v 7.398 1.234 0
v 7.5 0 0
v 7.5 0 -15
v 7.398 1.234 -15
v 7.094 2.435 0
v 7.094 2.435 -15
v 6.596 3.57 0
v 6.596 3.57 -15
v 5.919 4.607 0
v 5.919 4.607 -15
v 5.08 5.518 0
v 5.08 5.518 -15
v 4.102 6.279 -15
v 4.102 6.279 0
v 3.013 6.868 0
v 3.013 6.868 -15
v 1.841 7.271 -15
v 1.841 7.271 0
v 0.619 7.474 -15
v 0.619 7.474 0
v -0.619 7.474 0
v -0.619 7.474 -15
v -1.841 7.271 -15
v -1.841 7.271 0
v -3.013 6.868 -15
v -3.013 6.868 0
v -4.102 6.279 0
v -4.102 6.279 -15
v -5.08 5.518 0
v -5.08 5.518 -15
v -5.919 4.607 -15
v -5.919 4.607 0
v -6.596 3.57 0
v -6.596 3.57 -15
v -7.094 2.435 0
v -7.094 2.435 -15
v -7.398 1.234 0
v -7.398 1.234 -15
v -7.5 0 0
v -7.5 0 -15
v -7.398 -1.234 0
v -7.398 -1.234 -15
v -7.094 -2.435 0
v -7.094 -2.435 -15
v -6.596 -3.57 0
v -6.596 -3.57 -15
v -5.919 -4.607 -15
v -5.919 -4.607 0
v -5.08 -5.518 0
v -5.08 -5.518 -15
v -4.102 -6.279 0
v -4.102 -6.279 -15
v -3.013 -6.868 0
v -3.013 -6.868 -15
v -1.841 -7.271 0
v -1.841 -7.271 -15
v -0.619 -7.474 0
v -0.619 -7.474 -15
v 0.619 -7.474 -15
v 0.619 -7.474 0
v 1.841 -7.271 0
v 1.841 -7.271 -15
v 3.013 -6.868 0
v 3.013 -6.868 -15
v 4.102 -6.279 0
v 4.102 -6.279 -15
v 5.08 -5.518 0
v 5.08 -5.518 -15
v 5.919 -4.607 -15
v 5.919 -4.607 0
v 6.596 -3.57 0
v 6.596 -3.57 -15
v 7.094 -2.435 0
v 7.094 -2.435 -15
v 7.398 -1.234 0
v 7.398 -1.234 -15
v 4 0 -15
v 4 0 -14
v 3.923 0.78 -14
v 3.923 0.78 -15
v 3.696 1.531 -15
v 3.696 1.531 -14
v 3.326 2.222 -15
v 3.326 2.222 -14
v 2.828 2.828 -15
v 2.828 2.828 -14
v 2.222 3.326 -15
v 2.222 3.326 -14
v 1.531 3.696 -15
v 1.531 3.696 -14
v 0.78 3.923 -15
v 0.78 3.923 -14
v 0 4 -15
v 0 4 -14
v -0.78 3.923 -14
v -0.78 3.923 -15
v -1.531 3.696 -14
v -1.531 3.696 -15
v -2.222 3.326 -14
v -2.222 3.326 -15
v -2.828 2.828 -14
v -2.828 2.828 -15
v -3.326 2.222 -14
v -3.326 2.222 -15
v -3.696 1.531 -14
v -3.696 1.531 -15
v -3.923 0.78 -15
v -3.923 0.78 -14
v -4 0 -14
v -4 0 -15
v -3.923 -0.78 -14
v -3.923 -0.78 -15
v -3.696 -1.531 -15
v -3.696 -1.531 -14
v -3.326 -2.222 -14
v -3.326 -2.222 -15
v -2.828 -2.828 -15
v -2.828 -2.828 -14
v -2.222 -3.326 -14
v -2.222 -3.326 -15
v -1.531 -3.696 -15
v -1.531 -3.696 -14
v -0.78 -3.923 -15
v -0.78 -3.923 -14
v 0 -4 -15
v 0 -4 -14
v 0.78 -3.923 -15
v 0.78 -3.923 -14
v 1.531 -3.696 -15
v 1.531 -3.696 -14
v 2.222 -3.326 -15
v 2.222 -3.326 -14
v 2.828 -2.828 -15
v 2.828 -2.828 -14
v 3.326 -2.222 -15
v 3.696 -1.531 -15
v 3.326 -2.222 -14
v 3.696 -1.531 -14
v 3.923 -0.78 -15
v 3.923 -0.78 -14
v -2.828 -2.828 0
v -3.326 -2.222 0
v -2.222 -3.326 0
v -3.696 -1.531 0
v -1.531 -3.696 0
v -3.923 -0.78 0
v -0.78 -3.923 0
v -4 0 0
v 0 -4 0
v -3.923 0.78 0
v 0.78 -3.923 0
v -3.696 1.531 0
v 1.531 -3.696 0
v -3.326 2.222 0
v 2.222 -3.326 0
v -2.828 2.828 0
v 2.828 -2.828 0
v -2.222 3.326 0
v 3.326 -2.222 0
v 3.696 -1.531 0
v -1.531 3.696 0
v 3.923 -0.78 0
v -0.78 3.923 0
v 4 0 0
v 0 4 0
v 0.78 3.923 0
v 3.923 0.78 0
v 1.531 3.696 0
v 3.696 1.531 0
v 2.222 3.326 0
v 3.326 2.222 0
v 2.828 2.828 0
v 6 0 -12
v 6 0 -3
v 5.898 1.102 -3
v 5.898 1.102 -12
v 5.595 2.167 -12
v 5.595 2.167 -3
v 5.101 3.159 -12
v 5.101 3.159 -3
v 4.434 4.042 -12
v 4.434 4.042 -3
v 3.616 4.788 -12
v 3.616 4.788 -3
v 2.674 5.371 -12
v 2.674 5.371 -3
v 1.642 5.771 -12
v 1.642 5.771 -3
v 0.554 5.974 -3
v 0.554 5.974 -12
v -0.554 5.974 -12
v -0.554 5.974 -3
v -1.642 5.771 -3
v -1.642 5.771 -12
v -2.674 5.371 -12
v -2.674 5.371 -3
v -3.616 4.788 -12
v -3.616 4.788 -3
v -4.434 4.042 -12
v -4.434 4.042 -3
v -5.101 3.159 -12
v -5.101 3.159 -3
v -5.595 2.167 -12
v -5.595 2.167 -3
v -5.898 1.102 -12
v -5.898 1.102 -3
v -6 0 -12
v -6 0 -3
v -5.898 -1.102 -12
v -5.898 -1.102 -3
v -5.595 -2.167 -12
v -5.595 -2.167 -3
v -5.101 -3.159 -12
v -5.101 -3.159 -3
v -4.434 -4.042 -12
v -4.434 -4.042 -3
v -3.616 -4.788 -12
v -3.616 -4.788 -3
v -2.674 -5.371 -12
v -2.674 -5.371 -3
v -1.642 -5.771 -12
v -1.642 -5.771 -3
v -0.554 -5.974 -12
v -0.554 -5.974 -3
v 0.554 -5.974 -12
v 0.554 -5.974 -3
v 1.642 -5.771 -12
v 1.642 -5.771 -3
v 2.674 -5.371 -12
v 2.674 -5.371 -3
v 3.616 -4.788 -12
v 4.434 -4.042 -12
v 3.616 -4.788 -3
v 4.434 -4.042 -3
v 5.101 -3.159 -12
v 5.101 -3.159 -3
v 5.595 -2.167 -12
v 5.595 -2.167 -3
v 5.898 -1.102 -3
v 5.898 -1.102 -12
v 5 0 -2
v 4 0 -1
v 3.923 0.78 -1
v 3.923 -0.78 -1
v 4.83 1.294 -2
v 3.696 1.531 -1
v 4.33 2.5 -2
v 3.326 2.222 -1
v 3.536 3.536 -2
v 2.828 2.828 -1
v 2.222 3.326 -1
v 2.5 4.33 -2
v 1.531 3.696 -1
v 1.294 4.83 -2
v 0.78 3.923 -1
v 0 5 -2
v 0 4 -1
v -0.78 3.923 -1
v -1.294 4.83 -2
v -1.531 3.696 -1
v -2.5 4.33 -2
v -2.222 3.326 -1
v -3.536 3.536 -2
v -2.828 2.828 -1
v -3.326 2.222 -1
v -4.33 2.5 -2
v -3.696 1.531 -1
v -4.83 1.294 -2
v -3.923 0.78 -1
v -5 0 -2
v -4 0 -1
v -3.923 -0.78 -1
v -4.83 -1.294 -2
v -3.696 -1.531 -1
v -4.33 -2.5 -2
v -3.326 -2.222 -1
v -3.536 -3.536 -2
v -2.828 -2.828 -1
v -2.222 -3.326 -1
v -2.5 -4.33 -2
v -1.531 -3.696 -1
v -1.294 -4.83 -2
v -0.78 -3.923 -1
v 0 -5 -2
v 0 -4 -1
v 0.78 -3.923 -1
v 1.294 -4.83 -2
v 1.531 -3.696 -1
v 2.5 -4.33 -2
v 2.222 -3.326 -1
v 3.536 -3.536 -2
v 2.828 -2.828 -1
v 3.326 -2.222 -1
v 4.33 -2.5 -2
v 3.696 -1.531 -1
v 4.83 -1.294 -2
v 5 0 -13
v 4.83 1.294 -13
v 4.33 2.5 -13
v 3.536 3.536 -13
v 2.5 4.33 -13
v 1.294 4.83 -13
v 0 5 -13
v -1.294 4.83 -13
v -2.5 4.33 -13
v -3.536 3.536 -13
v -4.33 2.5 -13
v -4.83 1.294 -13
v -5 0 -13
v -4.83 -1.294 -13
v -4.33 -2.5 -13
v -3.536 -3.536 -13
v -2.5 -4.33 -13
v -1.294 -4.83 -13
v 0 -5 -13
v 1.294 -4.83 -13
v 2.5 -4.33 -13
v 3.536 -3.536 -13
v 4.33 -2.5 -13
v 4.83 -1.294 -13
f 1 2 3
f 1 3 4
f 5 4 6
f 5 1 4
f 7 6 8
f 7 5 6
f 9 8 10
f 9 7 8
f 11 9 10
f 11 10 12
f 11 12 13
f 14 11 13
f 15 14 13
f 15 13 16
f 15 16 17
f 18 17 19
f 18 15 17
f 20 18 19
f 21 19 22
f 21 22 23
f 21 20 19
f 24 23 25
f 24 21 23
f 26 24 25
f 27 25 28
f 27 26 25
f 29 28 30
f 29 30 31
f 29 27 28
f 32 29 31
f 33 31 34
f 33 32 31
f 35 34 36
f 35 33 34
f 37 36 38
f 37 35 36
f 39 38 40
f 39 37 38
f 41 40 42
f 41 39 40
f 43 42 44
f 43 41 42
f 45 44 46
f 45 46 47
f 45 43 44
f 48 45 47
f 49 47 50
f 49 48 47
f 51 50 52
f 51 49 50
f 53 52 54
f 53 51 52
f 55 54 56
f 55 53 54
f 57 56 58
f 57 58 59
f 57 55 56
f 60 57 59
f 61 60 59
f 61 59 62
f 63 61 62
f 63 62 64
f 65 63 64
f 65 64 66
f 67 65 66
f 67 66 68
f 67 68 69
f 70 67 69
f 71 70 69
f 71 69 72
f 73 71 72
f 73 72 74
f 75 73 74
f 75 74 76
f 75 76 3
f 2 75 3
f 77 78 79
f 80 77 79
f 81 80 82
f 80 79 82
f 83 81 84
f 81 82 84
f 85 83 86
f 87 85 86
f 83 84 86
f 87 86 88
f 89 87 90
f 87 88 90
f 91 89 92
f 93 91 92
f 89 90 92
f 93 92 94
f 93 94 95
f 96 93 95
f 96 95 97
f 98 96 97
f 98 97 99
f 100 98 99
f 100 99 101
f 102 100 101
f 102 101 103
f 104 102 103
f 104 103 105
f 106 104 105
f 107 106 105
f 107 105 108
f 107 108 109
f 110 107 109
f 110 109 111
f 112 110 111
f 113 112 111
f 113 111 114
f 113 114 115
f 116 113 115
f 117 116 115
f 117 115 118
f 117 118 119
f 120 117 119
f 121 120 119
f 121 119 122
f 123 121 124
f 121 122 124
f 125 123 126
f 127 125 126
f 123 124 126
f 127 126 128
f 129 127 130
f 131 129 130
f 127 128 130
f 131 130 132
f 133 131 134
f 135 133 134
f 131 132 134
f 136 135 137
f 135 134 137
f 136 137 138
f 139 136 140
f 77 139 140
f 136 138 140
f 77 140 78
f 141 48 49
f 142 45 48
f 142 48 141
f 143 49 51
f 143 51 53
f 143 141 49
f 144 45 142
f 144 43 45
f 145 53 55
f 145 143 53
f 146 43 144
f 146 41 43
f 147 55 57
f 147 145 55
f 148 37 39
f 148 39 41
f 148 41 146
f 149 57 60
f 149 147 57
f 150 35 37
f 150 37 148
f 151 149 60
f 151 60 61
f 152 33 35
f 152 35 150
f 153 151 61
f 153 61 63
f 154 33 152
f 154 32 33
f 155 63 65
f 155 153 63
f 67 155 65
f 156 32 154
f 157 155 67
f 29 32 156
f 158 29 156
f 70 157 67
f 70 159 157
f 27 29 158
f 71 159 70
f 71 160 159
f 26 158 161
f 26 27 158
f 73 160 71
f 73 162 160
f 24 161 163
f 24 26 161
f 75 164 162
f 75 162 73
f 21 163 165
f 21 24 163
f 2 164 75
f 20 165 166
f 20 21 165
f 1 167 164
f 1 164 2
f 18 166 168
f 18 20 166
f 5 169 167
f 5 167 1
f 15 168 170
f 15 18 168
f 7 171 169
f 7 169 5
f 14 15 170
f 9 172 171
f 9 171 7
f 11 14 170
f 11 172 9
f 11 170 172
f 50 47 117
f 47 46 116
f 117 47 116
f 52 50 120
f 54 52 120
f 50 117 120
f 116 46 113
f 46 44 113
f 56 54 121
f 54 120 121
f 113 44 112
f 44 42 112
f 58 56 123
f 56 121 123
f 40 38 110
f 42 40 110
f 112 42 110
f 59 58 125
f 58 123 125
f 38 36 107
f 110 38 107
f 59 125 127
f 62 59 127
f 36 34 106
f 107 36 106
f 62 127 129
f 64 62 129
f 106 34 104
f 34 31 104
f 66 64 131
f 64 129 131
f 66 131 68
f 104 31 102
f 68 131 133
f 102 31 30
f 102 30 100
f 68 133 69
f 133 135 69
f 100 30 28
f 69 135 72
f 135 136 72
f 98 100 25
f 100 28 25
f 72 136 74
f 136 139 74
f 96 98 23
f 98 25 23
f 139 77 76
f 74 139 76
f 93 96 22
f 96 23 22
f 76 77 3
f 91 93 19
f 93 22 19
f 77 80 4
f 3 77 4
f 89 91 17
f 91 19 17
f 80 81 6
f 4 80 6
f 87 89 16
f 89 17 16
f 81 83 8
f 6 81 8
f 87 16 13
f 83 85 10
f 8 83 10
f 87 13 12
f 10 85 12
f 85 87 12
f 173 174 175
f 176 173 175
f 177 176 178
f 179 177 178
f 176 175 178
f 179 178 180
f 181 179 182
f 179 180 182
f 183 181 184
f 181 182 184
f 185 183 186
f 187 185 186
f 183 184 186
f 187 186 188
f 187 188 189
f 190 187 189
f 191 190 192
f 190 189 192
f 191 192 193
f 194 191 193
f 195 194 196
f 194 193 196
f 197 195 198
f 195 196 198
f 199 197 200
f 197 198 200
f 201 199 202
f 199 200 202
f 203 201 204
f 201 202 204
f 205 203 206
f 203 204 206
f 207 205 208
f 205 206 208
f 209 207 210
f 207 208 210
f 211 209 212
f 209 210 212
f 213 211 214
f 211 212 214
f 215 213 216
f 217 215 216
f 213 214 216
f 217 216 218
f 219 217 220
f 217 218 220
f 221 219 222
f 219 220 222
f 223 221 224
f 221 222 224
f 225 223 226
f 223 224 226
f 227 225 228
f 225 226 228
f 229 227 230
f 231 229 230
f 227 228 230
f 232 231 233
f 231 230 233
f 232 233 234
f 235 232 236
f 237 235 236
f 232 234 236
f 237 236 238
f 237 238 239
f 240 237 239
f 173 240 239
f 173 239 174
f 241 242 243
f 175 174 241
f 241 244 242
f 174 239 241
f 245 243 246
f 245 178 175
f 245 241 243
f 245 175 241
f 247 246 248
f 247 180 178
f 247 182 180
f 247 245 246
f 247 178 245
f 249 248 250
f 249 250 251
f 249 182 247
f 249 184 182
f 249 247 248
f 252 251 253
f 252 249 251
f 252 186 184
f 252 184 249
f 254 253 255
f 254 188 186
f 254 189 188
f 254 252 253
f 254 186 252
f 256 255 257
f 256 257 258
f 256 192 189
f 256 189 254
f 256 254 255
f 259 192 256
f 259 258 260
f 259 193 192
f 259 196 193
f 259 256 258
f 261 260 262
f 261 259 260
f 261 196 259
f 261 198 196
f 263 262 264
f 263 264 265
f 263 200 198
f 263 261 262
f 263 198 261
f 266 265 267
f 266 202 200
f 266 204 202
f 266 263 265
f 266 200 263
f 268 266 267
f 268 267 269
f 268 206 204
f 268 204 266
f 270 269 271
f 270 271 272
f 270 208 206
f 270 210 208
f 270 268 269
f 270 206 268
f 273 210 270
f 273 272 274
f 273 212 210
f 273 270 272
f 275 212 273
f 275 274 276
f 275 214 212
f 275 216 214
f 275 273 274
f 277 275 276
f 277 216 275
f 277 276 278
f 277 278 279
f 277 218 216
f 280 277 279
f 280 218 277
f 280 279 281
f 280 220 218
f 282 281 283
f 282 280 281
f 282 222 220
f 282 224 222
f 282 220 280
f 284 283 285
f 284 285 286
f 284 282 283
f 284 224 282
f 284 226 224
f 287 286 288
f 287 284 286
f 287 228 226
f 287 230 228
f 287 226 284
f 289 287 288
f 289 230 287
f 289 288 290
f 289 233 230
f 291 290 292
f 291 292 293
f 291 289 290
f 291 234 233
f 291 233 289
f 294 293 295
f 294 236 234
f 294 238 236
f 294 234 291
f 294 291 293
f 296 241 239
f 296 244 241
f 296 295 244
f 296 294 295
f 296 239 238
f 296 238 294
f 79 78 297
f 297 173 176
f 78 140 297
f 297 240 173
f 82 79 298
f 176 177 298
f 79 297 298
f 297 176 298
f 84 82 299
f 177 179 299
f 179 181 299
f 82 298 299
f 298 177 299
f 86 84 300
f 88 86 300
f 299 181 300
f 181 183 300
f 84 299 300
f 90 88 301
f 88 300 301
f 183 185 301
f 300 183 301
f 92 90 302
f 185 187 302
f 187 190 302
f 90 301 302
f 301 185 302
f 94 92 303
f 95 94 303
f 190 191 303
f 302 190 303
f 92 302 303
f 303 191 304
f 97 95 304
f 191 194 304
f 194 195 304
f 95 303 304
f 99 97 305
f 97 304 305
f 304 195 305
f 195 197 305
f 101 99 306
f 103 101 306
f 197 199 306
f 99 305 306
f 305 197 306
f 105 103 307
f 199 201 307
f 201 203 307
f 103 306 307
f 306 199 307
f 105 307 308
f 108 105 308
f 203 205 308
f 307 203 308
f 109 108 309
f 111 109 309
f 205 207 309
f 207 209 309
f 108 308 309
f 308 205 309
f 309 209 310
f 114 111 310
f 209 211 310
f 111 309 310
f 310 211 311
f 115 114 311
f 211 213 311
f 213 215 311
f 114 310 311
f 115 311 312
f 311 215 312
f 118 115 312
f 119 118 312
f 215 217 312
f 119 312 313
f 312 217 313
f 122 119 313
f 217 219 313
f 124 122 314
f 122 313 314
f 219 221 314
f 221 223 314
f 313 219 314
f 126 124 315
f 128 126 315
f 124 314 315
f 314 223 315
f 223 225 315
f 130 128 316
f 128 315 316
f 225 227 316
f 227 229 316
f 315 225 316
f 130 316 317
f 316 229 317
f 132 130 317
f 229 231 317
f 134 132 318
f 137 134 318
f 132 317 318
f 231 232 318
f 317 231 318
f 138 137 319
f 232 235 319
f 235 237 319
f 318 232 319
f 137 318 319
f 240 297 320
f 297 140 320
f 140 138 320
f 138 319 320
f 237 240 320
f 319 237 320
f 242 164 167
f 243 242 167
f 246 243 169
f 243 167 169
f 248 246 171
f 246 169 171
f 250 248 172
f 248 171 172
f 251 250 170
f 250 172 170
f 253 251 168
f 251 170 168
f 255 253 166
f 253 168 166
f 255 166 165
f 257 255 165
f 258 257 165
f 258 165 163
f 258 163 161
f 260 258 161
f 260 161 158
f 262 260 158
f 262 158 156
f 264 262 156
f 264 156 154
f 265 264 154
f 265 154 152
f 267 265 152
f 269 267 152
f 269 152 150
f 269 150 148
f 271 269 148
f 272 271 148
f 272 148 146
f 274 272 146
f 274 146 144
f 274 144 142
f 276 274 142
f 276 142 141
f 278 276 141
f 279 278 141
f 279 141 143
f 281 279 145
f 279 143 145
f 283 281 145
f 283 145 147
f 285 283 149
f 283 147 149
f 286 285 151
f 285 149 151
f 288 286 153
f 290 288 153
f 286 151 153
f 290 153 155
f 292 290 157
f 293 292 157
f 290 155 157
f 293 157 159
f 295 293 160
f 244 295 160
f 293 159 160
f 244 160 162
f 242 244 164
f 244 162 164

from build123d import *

# Parameters (mm, degrees)
F0_R     = 7.5
F0_R_2   = 4
F2_DEPTH = 15
F3_R     = 6
F4_DEPTH = 9
F5_SIZE  = 1.99999


# Not quite as in the source:
# - a fillet or chamfer is up to 0.001 mm smaller than in the source, because OpenCascade refuses the exact size


with BuildPart() as f2:
    # F0 (on Top) → F2 (new body)
    with BuildSketch(Plane.XY):
        Circle(F0_R)
        Circle(F0_R_2, mode=Mode.SUBTRACT)
    extrude(amount=-F2_DEPTH)

    # F3 (on offset) → F4 (cut)
    with BuildSketch(Plane.XY.offset(-3)):
        Circle(F3_R)
    extrude(amount=-F4_DEPTH, mode=Mode.SUBTRACT)

    # F5 (size 2 in the source; OpenCascade refuses exactly that, so slightly less here)
    f5_edges = [f2.edges().sort_by_distance(p)[0] for p in [
        (-4, 0, -3),
        (-4, 0, -12),
    ]]
    chamfer(f5_edges, length=F5_SIZE)


solid = f2.part
